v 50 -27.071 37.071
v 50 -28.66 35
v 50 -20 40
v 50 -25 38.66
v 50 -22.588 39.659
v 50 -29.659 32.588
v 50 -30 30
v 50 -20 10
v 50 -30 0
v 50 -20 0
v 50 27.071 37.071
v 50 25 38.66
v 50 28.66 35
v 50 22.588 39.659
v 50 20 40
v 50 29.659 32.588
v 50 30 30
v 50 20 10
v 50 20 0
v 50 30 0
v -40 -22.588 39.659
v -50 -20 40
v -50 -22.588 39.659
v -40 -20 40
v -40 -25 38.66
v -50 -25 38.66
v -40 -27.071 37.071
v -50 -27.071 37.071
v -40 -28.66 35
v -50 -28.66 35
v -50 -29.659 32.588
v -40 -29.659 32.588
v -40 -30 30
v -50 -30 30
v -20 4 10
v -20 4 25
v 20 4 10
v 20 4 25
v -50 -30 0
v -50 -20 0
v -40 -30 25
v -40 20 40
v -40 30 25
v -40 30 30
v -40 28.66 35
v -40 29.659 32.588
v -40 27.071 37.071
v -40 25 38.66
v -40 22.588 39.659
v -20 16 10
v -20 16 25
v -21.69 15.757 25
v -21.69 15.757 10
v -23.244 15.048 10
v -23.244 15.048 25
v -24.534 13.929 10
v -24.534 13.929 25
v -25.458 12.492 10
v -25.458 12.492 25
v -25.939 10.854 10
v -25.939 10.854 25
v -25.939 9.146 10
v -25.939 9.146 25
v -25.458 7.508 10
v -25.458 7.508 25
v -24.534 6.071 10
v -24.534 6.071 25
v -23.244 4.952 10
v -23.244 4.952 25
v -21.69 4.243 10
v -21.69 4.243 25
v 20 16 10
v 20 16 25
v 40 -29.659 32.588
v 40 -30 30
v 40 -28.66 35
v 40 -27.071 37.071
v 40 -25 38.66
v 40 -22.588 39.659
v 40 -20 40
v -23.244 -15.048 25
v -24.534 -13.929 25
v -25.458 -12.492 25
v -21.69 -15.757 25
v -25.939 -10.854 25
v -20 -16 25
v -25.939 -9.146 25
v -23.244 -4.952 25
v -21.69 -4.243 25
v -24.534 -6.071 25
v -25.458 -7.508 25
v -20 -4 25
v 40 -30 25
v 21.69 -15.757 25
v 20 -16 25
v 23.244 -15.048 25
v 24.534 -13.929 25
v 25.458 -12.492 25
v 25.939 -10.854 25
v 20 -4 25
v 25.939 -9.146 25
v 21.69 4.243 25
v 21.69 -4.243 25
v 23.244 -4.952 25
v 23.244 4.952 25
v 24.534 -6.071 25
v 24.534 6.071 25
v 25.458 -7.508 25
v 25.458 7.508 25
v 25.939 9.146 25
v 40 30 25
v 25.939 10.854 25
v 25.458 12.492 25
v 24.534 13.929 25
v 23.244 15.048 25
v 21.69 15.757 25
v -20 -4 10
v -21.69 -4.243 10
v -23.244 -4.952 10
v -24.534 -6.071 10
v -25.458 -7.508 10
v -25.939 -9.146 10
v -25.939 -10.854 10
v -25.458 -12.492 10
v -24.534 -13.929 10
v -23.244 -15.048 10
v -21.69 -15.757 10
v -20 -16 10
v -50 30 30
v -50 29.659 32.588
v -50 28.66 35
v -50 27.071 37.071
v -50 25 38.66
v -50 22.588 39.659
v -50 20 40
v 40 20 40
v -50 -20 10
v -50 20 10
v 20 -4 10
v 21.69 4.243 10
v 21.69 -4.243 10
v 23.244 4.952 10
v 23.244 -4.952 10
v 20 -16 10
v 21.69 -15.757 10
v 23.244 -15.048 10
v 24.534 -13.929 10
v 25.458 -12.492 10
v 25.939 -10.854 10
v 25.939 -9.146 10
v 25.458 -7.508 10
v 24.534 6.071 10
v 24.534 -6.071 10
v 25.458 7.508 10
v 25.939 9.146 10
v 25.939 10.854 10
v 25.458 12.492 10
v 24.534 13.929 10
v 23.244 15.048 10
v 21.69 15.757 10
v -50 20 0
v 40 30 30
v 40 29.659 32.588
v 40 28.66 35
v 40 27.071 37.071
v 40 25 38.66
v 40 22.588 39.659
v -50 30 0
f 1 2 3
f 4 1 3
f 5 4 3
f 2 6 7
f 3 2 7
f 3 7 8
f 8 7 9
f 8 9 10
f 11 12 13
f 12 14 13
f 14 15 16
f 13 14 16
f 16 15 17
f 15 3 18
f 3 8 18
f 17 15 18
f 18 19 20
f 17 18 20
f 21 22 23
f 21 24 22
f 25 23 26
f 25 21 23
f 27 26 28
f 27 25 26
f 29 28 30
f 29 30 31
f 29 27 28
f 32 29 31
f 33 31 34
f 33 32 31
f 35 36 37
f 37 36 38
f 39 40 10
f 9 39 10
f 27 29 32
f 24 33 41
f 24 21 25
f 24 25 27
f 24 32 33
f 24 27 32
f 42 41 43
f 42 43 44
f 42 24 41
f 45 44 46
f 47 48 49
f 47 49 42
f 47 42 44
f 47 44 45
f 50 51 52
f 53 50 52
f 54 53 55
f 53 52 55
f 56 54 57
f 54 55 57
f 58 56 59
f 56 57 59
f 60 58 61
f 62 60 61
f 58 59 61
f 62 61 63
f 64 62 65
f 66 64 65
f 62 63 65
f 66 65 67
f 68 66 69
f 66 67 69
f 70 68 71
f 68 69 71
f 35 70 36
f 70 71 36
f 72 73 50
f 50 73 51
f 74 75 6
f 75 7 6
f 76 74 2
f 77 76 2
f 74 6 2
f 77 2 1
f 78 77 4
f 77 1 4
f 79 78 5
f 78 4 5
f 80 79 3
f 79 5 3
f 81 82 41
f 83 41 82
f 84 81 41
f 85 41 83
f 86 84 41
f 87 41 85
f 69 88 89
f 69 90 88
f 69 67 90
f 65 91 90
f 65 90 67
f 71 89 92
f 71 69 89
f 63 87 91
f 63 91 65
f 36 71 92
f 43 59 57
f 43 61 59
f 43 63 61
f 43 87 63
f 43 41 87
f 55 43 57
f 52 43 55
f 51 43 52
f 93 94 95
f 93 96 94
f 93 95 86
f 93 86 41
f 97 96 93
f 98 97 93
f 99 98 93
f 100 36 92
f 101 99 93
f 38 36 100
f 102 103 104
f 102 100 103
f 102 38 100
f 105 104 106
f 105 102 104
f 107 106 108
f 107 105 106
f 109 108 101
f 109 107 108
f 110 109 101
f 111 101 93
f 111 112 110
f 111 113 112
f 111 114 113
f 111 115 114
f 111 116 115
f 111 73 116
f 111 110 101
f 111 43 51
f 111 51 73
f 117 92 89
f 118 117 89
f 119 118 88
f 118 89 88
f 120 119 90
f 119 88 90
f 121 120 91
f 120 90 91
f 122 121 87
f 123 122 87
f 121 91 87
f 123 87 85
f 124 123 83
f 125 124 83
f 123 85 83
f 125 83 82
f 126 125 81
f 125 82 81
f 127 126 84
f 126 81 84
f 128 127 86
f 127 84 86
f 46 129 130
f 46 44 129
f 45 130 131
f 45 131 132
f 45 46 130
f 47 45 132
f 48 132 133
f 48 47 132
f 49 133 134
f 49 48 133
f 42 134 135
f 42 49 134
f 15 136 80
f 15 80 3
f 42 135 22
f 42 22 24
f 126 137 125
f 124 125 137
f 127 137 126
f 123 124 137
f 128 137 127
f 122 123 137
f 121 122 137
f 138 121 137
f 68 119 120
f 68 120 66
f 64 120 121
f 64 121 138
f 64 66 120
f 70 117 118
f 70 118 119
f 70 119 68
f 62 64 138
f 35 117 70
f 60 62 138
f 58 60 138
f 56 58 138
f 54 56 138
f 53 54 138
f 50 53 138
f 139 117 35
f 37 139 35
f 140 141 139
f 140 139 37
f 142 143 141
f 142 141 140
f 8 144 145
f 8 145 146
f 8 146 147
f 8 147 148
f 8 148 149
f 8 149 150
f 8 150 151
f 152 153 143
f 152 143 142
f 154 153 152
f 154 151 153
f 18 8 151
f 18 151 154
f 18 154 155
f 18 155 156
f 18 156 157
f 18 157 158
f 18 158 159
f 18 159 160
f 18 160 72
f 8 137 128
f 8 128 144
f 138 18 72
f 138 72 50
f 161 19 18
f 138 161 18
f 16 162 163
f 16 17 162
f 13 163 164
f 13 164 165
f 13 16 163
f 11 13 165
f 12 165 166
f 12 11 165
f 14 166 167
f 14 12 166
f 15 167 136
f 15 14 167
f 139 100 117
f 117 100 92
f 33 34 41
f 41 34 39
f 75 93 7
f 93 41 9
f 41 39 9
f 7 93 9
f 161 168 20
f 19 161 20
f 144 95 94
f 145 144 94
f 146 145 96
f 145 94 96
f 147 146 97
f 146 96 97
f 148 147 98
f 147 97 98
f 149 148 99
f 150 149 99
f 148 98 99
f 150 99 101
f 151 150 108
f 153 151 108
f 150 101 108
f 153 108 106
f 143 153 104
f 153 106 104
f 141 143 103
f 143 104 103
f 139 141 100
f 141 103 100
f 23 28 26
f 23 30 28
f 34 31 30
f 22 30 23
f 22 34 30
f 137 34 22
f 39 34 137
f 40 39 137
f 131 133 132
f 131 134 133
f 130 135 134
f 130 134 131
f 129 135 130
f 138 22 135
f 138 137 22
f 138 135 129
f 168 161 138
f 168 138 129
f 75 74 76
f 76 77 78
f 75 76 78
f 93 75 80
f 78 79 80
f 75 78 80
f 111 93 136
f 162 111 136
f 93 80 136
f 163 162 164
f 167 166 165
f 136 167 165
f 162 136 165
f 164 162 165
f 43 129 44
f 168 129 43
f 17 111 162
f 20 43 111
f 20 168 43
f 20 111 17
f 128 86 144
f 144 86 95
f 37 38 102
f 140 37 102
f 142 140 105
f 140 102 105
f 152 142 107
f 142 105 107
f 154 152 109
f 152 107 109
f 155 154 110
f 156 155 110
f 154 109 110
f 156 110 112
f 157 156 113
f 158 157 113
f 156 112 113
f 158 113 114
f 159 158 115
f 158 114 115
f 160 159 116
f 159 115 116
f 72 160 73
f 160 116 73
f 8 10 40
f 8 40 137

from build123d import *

# Parameters (mm, degrees)
F0_W     = 100
F0_H     = 60
F1_DEPTH = 40
F2_W     = 40
F2_H     = 10
F3_DEPTH = 100.001
F4_W     = 80
F4_H     = 60
F5_DEPTH = 15
F7_DEPTH = 25.001
F8_R     = 10


with BuildPart() as f1:
    # F0 (on Top) → F1 (new body)
    with BuildSketch(Plane.XY):
        Rectangle(F0_W, F0_H)
    extrude(amount=F1_DEPTH)

    # F2 (on face) → F3 (cut, through all)
    with BuildSketch(Plane.YZ.offset(50)):
        with Locations((0, 5)):
            Rectangle(F2_W, F2_H)
    extrude(amount=-F3_DEPTH, mode=Mode.SUBTRACT)

    # F4 (on face) → F5 (cut)
    with BuildSketch(Plane.XY.offset(40)):
        Rectangle(F4_W, F4_H)
    extrude(amount=-F5_DEPTH, mode=Mode.SUBTRACT)

    # F6 (on face) → F7 (cut, through all)
    with BuildSketch(Plane.XY.offset(25)):
        with BuildLine():
            Line((20, 16), (-20, 16))
            ThreePointArc((-20, 16), (-26, 10), (-20, 4))
            Line((-20, 4), (20, 4))
            ThreePointArc((20, 4), (26, 10), (20, 16))
        make_face()
        with BuildLine():
            Line((20, -4), (-20, -4))
            ThreePointArc((-20, -4), (-26, -10), (-20, -16))
            Line((-20, -16), (20, -16))
            ThreePointArc((20, -16), (26, -10), (20, -4))
        make_face()
    extrude(amount=-F7_DEPTH, mode=Mode.SUBTRACT)

    # F8
    f8_edges = [f1.edges().sort_by_distance(p)[0] for p in [
        (45, -30, 40),
        (-45, -30, 40),
        (45, 30, 40),
        (-45, 30, 40),
    ]]
    fillet(f8_edges, radius=F8_R)


solid = f1.part
